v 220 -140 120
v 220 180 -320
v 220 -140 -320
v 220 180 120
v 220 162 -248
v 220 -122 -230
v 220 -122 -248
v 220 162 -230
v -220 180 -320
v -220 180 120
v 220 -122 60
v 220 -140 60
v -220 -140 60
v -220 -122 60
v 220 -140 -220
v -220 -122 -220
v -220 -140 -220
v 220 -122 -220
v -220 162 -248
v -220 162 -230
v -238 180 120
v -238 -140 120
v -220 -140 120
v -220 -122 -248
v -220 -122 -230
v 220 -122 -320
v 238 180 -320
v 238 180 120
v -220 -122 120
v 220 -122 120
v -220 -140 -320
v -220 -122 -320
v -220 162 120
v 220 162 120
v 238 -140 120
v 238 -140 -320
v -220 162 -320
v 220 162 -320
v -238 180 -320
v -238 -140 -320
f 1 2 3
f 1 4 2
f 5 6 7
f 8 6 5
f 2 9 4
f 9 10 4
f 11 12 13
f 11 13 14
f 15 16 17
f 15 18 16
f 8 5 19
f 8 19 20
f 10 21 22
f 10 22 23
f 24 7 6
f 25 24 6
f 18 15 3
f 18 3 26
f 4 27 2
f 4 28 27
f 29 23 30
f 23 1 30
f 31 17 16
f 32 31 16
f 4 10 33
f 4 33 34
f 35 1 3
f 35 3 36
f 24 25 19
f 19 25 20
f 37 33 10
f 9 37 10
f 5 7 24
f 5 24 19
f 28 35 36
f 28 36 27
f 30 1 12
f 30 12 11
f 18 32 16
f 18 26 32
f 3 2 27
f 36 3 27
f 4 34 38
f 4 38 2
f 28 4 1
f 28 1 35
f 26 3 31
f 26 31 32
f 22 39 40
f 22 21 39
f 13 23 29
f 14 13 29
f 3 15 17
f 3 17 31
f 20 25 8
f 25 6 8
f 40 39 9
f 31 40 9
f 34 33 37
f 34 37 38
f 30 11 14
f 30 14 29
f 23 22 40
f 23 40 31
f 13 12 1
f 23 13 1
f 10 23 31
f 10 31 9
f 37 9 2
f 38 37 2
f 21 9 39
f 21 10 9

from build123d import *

# Parameters (mm, degrees)
F0_W          = 440
F0_H          = 18
F1_DEPTH      = 120
F1_DEPTH_BACK = 320
F2_DEPTH      = 120
F2_DEPTH_BACK = 320
F3_W          = 18
F3_H          = 60
F4_DEPTH      = 220
F4_DEPTH_BACK = 220
F3_W_2        = 284
F3_H_2        = 18
F5_DEPTH      = 220
F5_DEPTH_BACK = 220


with BuildPart() as f1:
    # F0 (on Top) → F1 (new body, two sides)
    with BuildSketch(Plane.XY) as f1_sk:
        with Locations((0, 171)):
            Rectangle(F0_W, F0_H)
    extrude(amount=F1_DEPTH)
    extrude(f1_sk.sketch, amount=-F1_DEPTH_BACK)


with BuildPart() as f2:
    # F0 (on Top) → F2 (new body, two sides)
    with BuildSketch(Plane.XY) as f2_sk:
        Polygon((-238, 180), (-238, -140), (-220, -140), (-220, 162), (-220, 180), align=None)
        Polygon((220, 180), (220, 162), (220, -140), (238, -140), (238, 180), align=None)
    extrude(amount=F2_DEPTH)
    extrude(f2_sk.sketch, amount=-F2_DEPTH_BACK)


with BuildPart() as f4:
    # F3 (on Right) → F4 (new body, two sides)
    with BuildSketch(Plane.YZ) as f4_sk:
        with Locations((-131, 90)):
            Rectangle(F3_W, F3_H)
        Polygon((-122, -248), (-122, -230), (-122, -220), (-140, -220), (-140, -320), (-122, -320), align=None)
    extrude(amount=F4_DEPTH)
    extrude(f4_sk.sketch, amount=-F4_DEPTH_BACK)


with BuildPart() as f5:
    # F3 (on Right) → F5 (new body, two sides)
    with BuildSketch(Plane.YZ) as f5_sk:
        with Locations((20, -239)):
            Rectangle(F3_W_2, F3_H_2)
    extrude(amount=F5_DEPTH)
    extrude(f5_sk.sketch, amount=-F5_DEPTH_BACK)


solid = Compound([f1.part, f2.part, f4.part, f5.part])
